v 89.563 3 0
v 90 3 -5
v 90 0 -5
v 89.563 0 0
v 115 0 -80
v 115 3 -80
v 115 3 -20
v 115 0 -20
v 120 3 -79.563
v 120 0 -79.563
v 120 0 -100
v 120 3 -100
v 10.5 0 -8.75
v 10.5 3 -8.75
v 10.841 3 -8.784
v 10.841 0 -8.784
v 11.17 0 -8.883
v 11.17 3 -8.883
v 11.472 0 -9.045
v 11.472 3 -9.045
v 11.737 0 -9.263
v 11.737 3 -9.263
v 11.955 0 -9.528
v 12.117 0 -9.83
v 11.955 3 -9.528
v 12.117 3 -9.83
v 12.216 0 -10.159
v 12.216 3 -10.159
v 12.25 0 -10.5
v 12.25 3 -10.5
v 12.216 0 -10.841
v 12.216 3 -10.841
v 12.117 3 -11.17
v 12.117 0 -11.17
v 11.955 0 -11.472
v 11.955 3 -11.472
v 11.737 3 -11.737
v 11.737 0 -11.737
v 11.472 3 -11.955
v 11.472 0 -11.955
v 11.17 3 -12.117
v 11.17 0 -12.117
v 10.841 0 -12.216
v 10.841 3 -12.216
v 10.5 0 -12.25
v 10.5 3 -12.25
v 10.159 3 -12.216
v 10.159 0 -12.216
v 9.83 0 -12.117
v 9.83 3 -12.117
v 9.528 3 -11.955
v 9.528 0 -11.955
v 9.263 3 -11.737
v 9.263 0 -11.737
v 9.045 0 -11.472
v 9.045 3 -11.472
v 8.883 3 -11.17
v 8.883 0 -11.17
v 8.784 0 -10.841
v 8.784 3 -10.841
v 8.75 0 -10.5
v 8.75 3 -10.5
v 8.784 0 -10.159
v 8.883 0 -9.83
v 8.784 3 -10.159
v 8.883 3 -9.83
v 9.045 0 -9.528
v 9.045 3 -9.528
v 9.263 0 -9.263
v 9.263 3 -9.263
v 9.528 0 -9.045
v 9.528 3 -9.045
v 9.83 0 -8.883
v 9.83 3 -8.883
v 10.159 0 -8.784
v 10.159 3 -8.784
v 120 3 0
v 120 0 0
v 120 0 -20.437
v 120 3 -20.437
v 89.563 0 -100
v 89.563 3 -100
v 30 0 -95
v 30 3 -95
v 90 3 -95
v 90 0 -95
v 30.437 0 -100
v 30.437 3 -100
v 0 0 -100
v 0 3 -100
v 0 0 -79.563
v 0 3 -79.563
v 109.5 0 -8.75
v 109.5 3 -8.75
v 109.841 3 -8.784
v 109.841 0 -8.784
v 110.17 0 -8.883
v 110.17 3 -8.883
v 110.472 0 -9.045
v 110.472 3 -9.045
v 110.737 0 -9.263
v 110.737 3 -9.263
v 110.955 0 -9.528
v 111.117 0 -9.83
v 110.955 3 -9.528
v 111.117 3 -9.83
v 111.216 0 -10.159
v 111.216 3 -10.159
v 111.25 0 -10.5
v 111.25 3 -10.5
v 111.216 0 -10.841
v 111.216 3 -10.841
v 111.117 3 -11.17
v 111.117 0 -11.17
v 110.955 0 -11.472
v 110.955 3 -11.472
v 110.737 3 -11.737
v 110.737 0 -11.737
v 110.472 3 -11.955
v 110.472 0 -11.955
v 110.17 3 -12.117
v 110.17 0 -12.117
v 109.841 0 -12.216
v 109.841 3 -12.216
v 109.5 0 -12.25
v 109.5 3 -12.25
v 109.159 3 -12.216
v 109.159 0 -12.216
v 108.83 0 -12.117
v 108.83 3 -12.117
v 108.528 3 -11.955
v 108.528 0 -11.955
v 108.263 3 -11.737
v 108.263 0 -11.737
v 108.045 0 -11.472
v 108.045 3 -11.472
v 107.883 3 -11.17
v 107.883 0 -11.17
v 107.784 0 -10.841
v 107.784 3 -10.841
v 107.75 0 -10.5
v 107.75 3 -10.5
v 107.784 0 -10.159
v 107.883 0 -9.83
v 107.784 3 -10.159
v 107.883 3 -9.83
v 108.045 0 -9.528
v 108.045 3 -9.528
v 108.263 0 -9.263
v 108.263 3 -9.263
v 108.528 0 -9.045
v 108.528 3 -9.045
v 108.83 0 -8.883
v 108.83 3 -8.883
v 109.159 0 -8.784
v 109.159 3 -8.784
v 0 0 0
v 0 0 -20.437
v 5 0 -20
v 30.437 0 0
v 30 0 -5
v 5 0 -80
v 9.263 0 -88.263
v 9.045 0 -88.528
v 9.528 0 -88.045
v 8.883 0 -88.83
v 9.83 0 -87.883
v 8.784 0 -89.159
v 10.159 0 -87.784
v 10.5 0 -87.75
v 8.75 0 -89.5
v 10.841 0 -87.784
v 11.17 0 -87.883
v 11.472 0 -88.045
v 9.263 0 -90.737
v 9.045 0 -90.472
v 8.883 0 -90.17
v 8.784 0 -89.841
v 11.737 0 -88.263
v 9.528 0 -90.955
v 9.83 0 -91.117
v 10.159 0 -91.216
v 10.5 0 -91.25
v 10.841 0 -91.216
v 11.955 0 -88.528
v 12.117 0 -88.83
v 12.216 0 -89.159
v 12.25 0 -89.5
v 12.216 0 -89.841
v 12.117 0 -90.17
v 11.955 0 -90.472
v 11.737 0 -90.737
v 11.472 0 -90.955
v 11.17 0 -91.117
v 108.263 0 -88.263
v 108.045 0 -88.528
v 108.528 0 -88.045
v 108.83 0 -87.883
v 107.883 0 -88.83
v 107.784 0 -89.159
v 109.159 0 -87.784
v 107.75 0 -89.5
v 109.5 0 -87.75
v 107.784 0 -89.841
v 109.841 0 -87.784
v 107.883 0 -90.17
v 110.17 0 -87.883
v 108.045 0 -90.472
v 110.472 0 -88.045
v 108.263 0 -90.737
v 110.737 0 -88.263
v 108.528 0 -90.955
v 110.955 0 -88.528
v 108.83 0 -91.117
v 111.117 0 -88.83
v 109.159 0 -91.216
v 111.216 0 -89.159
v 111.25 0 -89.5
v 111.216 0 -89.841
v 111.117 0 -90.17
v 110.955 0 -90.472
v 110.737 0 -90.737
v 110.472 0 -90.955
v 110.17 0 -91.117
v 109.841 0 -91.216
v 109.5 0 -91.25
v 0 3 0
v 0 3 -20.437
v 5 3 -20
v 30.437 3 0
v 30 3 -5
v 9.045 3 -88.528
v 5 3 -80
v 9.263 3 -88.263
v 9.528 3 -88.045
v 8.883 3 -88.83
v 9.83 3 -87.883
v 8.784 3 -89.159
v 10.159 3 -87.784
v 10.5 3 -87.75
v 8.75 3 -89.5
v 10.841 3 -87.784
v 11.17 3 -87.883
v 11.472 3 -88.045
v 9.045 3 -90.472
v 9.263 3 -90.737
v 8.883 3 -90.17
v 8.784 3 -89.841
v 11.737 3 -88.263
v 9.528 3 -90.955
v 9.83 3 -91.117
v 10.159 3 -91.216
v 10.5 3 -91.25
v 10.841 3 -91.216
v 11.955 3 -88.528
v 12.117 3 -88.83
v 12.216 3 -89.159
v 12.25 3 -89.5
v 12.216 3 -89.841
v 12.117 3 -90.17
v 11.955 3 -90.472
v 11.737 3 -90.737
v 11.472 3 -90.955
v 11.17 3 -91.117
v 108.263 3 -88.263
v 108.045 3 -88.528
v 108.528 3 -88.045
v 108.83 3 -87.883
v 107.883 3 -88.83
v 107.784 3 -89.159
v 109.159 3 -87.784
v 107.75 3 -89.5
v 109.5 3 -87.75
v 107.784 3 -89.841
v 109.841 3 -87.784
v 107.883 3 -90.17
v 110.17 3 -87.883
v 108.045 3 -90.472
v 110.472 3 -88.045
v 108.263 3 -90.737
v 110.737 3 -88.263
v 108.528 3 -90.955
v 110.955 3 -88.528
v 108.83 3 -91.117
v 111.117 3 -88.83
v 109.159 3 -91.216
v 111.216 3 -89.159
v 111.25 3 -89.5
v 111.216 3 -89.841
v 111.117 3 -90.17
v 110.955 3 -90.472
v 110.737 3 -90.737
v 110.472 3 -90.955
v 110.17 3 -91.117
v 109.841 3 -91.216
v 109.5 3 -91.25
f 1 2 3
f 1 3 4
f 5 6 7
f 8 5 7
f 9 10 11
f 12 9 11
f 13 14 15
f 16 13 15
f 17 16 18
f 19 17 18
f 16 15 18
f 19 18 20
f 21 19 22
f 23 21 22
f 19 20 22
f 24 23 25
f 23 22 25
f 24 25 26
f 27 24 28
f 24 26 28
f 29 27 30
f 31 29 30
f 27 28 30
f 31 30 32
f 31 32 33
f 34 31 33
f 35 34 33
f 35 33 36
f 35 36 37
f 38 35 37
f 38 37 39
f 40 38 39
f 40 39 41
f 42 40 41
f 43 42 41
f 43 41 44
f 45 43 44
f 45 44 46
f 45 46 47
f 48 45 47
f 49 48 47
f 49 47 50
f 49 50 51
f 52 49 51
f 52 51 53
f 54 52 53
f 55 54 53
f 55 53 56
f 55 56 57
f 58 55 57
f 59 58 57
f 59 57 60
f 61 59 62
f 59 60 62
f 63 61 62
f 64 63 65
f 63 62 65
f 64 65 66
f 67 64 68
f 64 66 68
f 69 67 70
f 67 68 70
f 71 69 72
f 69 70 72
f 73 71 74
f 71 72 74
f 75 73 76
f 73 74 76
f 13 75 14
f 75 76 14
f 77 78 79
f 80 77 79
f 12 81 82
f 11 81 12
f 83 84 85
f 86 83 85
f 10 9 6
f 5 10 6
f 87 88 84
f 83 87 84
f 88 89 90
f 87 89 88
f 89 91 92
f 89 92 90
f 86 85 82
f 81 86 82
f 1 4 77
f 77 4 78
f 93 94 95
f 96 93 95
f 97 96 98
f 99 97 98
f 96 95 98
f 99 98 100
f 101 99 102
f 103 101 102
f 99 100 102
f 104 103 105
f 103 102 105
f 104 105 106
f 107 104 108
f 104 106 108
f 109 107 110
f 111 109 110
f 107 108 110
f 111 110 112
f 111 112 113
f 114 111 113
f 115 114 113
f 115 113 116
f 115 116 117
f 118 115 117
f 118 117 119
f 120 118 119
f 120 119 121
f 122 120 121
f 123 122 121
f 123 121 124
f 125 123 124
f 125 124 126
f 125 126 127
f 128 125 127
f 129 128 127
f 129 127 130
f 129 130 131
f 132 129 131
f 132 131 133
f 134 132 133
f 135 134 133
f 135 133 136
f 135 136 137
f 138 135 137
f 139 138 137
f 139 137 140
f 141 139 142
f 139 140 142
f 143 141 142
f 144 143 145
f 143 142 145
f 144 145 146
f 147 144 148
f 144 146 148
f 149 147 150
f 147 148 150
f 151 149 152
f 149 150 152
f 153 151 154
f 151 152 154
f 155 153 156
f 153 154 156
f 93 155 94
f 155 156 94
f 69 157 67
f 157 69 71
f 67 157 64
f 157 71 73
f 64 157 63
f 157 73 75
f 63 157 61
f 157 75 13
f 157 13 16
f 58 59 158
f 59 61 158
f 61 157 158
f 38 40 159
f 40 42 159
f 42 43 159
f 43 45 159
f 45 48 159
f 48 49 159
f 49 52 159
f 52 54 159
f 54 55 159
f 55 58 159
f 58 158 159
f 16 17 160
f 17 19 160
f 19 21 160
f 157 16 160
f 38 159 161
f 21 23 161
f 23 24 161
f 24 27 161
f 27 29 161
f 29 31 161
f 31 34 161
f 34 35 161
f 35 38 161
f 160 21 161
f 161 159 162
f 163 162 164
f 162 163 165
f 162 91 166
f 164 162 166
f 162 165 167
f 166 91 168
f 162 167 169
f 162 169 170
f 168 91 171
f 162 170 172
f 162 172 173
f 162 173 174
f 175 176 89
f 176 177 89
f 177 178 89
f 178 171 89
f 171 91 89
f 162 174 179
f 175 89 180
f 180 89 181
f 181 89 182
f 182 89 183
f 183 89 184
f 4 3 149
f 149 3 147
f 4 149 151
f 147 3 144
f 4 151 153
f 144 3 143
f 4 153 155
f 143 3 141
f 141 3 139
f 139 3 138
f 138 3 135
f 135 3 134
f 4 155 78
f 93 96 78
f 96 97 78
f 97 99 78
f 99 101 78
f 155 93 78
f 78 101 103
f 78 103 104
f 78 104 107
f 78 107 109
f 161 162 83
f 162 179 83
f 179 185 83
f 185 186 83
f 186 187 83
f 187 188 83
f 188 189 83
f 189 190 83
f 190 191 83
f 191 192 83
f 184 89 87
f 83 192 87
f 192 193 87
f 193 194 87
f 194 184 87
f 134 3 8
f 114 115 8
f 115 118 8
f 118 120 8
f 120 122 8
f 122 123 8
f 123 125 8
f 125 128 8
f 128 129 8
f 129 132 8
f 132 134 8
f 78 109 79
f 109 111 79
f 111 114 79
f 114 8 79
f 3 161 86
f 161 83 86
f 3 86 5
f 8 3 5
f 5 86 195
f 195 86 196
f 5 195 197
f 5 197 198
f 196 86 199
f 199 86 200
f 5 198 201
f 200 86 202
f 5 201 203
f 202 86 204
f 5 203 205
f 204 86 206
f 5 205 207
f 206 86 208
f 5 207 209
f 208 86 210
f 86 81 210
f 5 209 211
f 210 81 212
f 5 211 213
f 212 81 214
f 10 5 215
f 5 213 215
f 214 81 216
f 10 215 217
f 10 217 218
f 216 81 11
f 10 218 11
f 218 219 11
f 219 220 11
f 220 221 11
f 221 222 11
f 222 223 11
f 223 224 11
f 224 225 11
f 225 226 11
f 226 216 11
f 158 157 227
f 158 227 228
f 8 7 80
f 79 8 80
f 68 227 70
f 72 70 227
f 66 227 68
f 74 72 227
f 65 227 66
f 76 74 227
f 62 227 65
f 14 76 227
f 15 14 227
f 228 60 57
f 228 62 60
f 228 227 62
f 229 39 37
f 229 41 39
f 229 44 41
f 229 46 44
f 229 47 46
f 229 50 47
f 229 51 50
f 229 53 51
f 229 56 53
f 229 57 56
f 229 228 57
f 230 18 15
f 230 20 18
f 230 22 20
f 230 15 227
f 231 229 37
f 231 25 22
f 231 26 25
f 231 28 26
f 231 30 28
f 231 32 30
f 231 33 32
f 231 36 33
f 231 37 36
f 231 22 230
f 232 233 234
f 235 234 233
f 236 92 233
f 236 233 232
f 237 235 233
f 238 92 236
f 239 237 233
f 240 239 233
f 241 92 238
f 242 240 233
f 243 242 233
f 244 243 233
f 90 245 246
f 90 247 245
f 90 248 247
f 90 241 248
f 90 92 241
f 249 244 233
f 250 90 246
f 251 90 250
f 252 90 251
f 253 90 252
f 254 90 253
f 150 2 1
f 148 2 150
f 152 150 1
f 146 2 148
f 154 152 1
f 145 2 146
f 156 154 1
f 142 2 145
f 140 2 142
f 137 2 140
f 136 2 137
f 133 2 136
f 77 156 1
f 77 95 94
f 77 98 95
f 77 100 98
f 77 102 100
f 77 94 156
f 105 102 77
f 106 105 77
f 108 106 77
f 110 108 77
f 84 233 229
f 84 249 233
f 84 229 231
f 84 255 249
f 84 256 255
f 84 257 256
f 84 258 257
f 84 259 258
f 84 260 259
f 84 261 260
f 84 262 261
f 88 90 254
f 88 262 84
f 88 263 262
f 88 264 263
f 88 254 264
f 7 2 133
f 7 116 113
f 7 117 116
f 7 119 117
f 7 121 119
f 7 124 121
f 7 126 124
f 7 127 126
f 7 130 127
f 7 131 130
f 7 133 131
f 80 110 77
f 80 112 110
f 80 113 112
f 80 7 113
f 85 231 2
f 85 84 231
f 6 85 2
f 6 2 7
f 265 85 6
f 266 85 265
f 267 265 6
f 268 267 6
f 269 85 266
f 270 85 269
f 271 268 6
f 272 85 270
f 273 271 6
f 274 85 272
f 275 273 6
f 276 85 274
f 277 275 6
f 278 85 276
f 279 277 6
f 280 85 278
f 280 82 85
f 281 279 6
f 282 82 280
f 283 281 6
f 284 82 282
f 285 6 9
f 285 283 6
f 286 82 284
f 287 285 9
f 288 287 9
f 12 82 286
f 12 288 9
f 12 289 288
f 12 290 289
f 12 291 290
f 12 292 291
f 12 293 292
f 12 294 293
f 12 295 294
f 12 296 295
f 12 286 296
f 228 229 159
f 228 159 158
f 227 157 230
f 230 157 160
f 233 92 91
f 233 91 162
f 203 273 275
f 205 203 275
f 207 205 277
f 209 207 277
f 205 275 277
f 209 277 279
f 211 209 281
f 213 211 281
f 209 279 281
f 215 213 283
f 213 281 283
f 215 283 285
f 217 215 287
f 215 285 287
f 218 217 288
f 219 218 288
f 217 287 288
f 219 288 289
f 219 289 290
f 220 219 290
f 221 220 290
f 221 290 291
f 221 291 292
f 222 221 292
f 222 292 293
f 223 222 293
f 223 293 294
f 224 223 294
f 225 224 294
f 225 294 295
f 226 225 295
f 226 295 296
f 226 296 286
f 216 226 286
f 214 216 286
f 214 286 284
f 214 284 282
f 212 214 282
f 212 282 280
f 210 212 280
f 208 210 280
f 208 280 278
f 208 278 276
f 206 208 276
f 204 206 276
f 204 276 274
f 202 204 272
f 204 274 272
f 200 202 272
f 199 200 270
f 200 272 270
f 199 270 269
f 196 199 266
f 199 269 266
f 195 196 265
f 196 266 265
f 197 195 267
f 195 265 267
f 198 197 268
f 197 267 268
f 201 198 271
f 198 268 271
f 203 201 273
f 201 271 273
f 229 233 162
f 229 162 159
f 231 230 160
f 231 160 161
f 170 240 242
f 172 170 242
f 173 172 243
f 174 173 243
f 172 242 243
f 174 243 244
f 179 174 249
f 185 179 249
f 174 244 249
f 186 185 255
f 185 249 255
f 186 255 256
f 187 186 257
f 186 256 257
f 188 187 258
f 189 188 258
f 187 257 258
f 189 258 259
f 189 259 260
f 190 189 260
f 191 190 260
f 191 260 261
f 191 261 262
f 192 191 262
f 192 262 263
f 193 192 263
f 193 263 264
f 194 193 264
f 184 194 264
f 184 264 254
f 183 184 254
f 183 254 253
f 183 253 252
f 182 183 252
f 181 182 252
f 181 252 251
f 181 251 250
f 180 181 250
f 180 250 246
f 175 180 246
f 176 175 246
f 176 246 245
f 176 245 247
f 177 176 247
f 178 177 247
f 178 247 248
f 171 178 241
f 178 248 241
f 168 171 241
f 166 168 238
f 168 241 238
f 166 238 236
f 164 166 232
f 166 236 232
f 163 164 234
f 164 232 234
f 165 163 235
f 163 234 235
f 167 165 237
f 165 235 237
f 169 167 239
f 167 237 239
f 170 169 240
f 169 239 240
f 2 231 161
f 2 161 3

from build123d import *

# Parameters (mm, degrees)
SKETCH1_W           = 120
SKETCH1_H           = 100
PLATEFORM_DEPTH     = 3
CUT_ARMS_DEPTH      = 10
HOLES_SPACERS_REACH = 158.234
SKETCH6_R           = 1.75


with BuildPart() as part:
    # Sketch1 → plateform (new body)
    with BuildSketch(Plane(origin=(0, 0, 0), x_dir=(1, 0, 0), z_dir=(0, 1, 0))):
        with Locations((60, 50)):
            Rectangle(SKETCH1_W, SKETCH1_H)
    extrude(amount=PLATEFORM_DEPTH)

    # Sketch2 → cut_arms (cut)
    with BuildSketch(Plane(origin=(0, 3, 0), x_dir=(1, 0, 0), z_dir=(0, 1, 0))):
        Polygon((0, 79.562556682), (5, 80), (5, 20), (0, 20.437443318), align=None)
        Polygon((30.437443318, 100), (30, 95), (90, 95), (89.562556682, 100), align=None)
        Polygon((120, 79.562556682), (115, 80), (115, 20), (120, 20.437443318), align=None)
        Polygon((30.437443318, 0), (30, 5), (90, 5), (89.562556682, 0), align=None)
    extrude(amount=-CUT_ARMS_DEPTH, mode=Mode.SUBTRACT)

    # Sketch6 → holes_spacers (cut, up to next)
    with BuildSketch(Plane(origin=(0, 3, 0), x_dir=(1, 0, 0), z_dir=(0, 1, 0)), mode=Mode.PRIVATE) as holes_spacers_sk1:
        with Locations(Location((10.5, 89.5, 0), (0, 0, 270))):
            Circle(SKETCH6_R)
    holes_spacers_tool1 = extrude(holes_spacers_sk1.sketch, amount=-HOLES_SPACERS_REACH, mode=Mode.PRIVATE) & part.part
    # Sketch6 → holes_spacers (cut, up to next)
    with BuildSketch(Plane(origin=(0, 3, 0), x_dir=(1, 0, 0), z_dir=(0, 1, 0)), mode=Mode.PRIVATE) as holes_spacers_sk2:
        with Locations(Location((109.5, 89.5, 0), (0, 0, 270))):
            Circle(SKETCH6_R)
    holes_spacers_tool2 = extrude(holes_spacers_sk2.sketch, amount=-HOLES_SPACERS_REACH, mode=Mode.PRIVATE) & part.part
    # Sketch6 → holes_spacers (cut, up to next)
    with BuildSketch(Plane(origin=(0, 3, 0), x_dir=(1, 0, 0), z_dir=(0, 1, 0)), mode=Mode.PRIVATE) as holes_spacers_sk3:
        with Locations(Location((109.5, 10.5, 0), (0, 0, 270))):
            Circle(SKETCH6_R)
    holes_spacers_tool3 = extrude(holes_spacers_sk3.sketch, amount=-HOLES_SPACERS_REACH, mode=Mode.PRIVATE) & part.part
    # Sketch6 → holes_spacers (cut, up to next)
    with BuildSketch(Plane(origin=(0, 3, 0), x_dir=(1, 0, 0), z_dir=(0, 1, 0)), mode=Mode.PRIVATE) as holes_spacers_sk4:
        with Locations(Location((10.5, 10.5, 0), (0, 0, 270))):
            Circle(SKETCH6_R)
    holes_spacers_tool4 = extrude(holes_spacers_sk4.sketch, amount=-HOLES_SPACERS_REACH, mode=Mode.PRIVATE) & part.part
    add(holes_spacers_tool1.solids().sort_by_distance((10.5, 3, -89.5))[0], mode=Mode.SUBTRACT)
    add(holes_spacers_tool2.solids().sort_by_distance((109.5, 3, -89.5))[0], mode=Mode.SUBTRACT)
    add(holes_spacers_tool3.solids().sort_by_distance((109.5, 3, -10.5))[0], mode=Mode.SUBTRACT)
    add(holes_spacers_tool4.solids().sort_by_distance((10.5, 3, -10.5))[0], mode=Mode.SUBTRACT)


solid = part.part
